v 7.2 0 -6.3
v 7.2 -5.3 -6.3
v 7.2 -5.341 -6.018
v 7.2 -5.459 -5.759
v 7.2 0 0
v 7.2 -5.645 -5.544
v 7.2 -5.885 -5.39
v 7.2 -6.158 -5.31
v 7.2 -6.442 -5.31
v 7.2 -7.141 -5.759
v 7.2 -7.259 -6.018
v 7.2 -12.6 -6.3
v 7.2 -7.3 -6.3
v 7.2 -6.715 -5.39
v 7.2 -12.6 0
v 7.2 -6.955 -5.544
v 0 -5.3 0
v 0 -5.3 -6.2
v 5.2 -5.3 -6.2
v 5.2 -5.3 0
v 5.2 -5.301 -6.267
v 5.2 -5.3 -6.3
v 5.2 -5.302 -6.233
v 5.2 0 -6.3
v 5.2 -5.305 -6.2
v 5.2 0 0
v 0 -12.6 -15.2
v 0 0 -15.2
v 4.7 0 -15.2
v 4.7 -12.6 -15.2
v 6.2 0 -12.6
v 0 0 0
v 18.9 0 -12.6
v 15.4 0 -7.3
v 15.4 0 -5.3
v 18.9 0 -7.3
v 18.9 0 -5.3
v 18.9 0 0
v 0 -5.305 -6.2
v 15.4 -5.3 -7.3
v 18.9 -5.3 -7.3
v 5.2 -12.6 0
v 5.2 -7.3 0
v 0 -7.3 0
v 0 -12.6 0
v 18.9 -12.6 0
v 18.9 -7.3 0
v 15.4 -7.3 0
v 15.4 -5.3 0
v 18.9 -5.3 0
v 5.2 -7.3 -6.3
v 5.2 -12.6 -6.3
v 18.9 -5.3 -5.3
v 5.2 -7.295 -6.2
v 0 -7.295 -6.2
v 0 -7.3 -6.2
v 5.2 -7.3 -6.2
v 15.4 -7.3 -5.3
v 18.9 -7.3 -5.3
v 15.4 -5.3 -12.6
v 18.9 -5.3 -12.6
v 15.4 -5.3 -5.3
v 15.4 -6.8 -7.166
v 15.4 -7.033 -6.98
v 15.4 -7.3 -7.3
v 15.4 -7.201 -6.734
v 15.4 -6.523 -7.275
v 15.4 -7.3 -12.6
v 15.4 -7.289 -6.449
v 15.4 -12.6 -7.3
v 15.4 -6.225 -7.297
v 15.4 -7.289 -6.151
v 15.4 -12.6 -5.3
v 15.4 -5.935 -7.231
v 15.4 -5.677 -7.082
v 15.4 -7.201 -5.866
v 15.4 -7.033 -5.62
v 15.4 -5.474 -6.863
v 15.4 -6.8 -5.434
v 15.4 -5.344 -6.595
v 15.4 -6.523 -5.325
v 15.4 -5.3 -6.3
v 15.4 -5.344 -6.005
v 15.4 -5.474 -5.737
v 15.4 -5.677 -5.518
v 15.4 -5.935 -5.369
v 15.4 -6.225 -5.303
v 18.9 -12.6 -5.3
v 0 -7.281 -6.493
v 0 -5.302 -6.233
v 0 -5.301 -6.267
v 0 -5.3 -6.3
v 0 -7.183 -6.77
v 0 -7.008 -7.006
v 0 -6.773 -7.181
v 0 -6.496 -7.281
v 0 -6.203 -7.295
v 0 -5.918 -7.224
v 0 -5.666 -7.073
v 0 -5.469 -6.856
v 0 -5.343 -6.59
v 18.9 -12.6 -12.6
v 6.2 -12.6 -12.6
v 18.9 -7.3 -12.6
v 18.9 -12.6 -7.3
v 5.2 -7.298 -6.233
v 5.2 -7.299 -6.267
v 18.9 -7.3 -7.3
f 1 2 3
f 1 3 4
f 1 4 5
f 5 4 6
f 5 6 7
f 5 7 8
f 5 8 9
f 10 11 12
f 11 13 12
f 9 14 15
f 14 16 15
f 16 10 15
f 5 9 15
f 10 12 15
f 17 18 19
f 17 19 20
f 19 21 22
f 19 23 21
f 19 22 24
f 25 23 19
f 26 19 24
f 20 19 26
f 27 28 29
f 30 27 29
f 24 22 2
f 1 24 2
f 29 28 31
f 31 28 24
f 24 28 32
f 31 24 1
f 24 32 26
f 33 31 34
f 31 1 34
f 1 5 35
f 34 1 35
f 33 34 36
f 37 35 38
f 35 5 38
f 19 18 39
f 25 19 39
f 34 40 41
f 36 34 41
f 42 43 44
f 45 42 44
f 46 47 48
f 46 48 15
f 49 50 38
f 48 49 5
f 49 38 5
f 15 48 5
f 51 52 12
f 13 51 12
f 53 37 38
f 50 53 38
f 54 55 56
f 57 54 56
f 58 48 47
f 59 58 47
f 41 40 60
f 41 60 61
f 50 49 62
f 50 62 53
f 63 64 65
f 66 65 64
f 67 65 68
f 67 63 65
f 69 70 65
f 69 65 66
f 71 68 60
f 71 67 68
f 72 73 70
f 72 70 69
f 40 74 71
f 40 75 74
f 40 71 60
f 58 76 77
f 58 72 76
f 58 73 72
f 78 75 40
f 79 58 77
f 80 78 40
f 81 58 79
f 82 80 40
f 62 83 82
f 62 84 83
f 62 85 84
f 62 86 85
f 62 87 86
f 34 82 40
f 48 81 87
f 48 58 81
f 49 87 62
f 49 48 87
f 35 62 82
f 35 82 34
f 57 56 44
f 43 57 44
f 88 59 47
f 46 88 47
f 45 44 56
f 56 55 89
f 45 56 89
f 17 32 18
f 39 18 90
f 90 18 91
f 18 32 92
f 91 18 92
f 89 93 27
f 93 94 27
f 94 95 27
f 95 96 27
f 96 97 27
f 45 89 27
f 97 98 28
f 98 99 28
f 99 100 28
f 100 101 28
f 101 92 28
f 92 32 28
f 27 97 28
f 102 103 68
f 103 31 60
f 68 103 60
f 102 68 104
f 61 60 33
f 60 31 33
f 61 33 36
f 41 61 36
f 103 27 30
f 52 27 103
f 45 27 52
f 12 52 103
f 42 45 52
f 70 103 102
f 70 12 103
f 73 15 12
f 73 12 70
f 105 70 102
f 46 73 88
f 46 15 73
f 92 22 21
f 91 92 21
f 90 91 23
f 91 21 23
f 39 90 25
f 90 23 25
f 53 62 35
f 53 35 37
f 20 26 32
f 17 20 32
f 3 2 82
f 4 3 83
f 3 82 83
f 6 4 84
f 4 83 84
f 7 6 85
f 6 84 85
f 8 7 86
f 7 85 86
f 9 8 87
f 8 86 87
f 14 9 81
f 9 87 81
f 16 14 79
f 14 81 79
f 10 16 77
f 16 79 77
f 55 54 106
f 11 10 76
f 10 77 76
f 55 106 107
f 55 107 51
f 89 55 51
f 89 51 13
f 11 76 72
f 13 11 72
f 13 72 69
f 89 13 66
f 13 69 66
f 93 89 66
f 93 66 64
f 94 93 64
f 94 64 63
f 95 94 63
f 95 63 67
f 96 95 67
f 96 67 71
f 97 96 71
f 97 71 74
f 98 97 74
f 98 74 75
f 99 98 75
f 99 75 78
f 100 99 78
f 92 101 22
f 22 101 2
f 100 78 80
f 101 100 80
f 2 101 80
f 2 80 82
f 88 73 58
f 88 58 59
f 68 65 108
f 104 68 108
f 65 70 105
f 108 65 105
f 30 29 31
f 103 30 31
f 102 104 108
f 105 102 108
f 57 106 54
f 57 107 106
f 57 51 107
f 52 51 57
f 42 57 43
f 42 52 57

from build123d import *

# Parameters (mm, degrees)
F1_DEPTH  = 12.6
F2_W      = 2
F2_H      = 6.3
F3_DEPTH  = 12.601
F4_W      = 2
F4_H      = 6.2
F5_DEPTH  = 7.2
F6_W      = 3.5
F6_H      = 2
F7_DEPTH  = 12.601
F8_W      = 3.5
F8_H      = 2
F9_DEPTH  = 15.201
F10_R     = 1
F11_DEPTH = 15.401


with BuildPart() as f1:
    # F0 (on Front) → F1 (new body)
    with BuildSketch(Plane.XZ):
        Polygon((18.9, 0), (0, 0), (0, -12.6), (0, -15.2), (4.7, -15.2), (6.2, -12.6), (18.9, -12.6), align=None)
    extrude(amount=F1_DEPTH)

    # F2 (on face) → F3 (cut, through all)
    with BuildSketch(Plane.XZ.offset(12.6)):
        with Locations((6.2, -3.15)):
            Rectangle(F2_W, F2_H)
    extrude(amount=-F3_DEPTH, mode=Mode.SUBTRACT)

    # F4 (on face) → F5 (cut)
    with BuildSketch(Plane(origin=(0, 0, 0), x_dir=(0, -1, 0), z_dir=(-1, 0, 0))):
        with Locations((6.3, -3.1)):
            Rectangle(F4_W, F4_H)
    extrude(amount=-F5_DEPTH, mode=Mode.SUBTRACT)

    # F6 (on face) → F7 (cut, through all)
    with BuildSketch(Plane.XZ.offset(12.6)):
        with Locations((17.15, -6.3)):
            Rectangle(F6_W, F6_H)
    extrude(amount=-F7_DEPTH, mode=Mode.SUBTRACT)

    # F8 (on face) → F9 (cut, through all)
    with BuildSketch(Plane.XY):
        with Locations((17.15, -6.3)):
            Rectangle(F8_W, F8_H)
    extrude(amount=-F9_DEPTH, mode=Mode.SUBTRACT)

    # F10 (on face) → F11 (cut, through all)
    with BuildSketch(Plane.YZ.offset(15.4)):
        with Locations((-6.3, -6.3)):
            Circle(F10_R)
    extrude(amount=-F11_DEPTH, mode=Mode.SUBTRACT)


solid = f1.part
